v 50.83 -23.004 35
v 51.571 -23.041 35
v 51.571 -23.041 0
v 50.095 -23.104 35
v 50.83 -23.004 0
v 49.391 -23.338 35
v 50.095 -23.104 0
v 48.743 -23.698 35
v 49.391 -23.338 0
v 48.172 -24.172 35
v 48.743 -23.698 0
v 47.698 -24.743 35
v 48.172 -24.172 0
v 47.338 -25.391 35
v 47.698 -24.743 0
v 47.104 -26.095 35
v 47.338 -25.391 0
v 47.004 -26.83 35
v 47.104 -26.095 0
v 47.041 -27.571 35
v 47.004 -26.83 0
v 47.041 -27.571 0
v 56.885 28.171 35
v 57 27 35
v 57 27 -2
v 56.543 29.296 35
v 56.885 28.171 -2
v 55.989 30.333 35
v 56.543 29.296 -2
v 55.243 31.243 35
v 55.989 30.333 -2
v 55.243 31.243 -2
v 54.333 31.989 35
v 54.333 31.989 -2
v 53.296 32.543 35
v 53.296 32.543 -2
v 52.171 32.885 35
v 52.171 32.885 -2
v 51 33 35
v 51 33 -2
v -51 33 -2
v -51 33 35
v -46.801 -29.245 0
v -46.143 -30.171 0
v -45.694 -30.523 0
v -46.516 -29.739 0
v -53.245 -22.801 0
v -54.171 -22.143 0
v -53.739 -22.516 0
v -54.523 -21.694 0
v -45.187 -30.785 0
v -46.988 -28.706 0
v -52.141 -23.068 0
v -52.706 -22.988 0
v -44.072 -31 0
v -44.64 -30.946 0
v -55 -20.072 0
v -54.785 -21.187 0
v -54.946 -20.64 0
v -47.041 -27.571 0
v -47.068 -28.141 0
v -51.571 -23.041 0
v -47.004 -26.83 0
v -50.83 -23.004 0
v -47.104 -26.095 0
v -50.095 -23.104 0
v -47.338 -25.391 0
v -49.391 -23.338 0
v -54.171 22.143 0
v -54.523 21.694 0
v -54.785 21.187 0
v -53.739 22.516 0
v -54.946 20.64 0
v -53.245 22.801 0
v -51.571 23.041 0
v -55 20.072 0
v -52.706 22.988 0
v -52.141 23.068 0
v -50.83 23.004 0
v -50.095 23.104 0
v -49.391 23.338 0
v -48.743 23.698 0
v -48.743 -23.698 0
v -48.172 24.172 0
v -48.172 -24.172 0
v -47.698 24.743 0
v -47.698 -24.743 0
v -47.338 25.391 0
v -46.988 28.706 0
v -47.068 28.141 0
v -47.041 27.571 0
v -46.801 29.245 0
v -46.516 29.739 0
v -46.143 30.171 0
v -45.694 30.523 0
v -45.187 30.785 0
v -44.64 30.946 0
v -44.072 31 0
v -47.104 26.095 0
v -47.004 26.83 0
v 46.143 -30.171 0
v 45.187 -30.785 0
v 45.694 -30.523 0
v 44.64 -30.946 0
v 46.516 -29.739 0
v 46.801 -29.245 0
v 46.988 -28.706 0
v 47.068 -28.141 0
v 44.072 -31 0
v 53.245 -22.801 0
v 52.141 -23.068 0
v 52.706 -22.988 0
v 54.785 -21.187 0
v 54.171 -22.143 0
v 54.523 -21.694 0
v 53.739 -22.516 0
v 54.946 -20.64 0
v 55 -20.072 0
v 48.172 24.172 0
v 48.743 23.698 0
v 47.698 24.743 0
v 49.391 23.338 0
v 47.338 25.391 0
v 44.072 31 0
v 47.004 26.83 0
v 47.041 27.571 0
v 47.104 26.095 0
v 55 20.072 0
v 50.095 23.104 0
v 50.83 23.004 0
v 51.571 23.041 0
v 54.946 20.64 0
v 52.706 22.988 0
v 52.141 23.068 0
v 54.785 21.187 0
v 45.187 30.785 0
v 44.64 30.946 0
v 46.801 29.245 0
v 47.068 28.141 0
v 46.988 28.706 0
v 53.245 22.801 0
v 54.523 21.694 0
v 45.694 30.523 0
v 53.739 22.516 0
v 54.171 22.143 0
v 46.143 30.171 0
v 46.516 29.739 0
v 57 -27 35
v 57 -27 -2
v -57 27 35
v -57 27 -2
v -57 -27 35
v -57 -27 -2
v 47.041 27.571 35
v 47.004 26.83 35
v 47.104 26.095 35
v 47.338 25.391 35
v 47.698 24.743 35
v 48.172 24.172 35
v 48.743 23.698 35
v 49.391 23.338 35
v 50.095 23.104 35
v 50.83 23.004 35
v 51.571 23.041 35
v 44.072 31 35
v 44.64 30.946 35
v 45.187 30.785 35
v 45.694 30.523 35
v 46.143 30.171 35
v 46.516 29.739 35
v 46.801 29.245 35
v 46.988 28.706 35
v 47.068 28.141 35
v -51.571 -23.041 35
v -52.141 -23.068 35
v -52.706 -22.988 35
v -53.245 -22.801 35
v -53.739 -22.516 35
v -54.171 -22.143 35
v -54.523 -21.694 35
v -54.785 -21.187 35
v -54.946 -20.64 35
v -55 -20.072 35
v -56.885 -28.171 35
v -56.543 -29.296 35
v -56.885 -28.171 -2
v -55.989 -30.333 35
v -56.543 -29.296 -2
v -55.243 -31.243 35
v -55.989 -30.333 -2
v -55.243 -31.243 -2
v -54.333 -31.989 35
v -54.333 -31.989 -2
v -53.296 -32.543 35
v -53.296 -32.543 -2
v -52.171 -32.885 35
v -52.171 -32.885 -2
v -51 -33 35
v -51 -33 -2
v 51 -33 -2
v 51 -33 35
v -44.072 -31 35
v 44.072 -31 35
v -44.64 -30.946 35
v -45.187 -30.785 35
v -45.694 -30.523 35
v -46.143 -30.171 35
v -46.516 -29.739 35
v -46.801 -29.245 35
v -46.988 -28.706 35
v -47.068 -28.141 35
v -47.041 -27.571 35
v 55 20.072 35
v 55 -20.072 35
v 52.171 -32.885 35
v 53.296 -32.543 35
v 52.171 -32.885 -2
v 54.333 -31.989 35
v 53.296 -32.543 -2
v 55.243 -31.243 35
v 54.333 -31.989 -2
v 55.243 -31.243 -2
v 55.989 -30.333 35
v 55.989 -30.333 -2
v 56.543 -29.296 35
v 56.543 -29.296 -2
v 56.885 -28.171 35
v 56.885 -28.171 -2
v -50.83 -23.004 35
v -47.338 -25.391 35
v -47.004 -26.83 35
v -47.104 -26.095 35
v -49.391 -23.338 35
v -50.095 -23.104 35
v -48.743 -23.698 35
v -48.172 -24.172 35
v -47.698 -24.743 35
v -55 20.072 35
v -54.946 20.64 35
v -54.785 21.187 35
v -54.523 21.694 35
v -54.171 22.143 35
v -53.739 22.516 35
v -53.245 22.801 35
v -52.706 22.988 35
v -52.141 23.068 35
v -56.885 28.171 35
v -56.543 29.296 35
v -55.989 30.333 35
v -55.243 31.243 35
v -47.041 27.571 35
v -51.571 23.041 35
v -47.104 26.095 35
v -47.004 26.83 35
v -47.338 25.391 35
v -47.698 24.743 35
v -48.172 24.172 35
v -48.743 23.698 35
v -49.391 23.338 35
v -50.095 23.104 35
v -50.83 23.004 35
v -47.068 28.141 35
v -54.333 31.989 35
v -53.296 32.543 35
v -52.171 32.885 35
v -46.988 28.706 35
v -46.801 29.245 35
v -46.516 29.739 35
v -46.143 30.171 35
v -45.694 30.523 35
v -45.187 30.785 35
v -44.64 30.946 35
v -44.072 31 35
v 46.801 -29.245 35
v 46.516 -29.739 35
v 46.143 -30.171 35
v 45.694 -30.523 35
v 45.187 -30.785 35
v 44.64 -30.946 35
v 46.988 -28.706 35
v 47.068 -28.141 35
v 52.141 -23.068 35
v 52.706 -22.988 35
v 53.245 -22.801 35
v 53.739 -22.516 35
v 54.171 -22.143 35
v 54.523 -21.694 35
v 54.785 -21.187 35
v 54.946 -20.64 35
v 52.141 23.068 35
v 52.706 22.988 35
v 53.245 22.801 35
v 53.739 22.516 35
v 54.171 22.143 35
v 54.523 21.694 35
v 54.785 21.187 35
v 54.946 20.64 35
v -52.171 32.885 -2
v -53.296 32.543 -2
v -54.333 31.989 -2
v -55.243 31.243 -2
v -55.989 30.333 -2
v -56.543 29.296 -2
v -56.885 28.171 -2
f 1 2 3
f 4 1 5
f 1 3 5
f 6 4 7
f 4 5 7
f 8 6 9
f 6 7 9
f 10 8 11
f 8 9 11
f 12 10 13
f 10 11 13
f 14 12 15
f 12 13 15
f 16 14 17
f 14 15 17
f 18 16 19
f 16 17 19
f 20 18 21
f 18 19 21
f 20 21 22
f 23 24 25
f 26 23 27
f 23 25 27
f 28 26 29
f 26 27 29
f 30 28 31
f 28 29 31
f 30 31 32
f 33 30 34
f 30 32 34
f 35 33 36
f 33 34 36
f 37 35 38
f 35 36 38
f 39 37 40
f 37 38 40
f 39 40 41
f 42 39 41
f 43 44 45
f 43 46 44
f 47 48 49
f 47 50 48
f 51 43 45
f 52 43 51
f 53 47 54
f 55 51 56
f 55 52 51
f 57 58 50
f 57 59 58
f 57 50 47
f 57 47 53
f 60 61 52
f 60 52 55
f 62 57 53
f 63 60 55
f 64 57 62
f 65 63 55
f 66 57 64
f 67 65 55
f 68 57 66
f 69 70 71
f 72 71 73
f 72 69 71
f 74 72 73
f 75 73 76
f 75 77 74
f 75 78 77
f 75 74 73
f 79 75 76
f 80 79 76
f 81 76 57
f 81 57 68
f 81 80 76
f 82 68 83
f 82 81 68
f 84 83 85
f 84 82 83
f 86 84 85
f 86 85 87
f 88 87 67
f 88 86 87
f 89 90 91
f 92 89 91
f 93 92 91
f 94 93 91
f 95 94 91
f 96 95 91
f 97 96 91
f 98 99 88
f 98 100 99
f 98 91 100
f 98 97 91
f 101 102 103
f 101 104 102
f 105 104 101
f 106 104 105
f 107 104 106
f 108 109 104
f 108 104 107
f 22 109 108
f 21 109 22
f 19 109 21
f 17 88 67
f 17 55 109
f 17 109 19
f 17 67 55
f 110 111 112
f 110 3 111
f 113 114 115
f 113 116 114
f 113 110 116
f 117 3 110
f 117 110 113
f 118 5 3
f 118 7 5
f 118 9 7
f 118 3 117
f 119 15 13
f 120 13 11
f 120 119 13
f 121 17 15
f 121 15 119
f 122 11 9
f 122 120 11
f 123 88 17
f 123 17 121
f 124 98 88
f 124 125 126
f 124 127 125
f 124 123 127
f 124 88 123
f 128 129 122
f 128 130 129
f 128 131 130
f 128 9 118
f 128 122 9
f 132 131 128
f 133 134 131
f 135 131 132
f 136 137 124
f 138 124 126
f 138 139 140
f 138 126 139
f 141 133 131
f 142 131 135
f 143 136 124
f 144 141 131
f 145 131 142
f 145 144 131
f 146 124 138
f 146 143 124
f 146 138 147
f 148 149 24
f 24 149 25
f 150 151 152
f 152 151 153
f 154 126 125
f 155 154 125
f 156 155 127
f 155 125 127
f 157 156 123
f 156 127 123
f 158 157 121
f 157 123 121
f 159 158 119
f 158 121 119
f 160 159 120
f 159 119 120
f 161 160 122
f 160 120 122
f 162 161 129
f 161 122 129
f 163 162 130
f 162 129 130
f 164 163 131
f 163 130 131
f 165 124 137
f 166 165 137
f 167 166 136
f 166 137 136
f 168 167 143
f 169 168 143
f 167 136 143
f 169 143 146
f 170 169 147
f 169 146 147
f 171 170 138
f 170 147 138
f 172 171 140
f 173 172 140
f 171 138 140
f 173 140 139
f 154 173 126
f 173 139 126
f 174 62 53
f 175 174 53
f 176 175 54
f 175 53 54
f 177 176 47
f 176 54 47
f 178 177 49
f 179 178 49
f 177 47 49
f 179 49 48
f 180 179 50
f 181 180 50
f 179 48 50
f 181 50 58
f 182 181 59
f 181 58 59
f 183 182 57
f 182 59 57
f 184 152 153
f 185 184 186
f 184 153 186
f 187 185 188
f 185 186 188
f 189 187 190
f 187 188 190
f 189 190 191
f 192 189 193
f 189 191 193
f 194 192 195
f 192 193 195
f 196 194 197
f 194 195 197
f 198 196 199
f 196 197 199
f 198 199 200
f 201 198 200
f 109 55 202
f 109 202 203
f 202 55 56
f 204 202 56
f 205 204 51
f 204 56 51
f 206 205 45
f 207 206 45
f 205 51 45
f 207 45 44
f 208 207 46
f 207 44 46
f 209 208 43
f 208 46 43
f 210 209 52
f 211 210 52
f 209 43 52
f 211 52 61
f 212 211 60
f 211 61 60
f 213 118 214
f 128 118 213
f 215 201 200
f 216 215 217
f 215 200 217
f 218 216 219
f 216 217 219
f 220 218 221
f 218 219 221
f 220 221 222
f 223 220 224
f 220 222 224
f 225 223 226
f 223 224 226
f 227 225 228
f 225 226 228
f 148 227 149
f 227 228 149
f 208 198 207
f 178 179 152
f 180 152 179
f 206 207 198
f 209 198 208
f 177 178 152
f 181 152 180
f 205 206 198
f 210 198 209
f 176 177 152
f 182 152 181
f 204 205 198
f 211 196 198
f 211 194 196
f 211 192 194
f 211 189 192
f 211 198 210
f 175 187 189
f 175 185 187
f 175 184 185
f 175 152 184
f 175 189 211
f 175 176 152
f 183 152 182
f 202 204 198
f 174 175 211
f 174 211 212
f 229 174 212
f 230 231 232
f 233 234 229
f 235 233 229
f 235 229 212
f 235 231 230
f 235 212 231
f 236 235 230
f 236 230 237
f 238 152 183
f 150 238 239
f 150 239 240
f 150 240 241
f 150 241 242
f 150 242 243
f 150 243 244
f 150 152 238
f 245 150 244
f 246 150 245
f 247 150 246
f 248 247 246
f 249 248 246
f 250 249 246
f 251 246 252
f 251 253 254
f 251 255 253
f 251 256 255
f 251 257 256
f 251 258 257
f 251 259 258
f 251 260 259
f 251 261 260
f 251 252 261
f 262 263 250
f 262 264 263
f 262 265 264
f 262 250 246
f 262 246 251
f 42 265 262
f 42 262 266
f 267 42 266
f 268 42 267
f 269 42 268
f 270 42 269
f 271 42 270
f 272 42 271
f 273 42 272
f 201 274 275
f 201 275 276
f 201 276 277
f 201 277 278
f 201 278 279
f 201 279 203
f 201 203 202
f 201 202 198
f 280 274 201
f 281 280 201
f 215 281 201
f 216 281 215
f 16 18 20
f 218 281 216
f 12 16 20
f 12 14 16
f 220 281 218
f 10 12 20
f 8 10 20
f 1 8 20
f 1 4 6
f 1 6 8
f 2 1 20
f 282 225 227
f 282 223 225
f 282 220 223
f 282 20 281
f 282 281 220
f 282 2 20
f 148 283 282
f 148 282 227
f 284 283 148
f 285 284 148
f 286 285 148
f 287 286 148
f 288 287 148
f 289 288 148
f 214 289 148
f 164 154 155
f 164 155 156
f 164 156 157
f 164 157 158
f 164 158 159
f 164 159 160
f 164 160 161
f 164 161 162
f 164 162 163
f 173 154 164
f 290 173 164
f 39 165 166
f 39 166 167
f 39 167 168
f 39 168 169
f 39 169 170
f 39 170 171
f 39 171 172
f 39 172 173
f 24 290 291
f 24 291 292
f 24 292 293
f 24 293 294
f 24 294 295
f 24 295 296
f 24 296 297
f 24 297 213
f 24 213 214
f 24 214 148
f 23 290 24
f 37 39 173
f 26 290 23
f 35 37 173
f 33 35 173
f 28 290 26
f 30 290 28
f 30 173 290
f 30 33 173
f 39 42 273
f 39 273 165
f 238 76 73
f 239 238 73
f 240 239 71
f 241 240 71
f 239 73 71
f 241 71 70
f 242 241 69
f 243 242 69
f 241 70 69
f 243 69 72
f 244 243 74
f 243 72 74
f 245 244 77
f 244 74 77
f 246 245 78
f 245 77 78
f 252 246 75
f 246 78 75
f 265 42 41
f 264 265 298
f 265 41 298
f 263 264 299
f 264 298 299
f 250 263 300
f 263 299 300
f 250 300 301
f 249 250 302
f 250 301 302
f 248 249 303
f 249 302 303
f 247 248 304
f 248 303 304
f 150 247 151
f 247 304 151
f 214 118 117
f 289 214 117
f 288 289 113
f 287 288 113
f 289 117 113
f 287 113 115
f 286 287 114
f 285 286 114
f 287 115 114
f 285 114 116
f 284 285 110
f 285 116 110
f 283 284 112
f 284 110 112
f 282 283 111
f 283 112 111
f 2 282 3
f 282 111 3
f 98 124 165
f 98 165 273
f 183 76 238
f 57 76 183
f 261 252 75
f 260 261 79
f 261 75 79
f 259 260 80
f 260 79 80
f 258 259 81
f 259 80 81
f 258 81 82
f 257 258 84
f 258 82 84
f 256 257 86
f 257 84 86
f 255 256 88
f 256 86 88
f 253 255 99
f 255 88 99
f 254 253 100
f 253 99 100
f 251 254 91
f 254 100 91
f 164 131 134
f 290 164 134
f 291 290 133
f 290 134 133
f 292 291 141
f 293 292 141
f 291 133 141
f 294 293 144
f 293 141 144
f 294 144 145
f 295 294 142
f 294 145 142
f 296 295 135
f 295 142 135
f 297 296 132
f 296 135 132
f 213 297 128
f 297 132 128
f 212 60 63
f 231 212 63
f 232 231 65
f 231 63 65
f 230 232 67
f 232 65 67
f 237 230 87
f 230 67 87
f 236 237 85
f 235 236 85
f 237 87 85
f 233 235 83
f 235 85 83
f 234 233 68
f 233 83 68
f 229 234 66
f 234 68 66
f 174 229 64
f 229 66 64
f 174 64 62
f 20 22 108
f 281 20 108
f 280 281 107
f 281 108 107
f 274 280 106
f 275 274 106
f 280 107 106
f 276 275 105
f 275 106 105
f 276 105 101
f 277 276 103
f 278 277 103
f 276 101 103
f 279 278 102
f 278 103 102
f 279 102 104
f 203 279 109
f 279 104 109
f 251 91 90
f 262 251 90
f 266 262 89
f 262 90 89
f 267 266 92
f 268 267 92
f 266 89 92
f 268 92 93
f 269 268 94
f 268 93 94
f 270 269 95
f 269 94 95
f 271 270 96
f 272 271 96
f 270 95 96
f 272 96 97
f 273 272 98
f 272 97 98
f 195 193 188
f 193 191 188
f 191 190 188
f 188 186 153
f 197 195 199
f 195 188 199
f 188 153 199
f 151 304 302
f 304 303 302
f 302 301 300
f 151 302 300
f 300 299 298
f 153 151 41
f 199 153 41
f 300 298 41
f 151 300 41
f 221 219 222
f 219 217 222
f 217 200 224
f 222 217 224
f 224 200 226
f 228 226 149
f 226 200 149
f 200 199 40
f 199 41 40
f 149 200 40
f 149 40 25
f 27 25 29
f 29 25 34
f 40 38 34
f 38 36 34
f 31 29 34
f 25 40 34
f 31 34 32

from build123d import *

# Parameters (mm, degrees)
BOSS_EXTRUDE1_DEPTH = 35
SHELL1_T            = 2
SKETCH2_R           = 4
BOSS_EXTRUDE2_DEPTH = 35
FILLET2_START       = -1
FILLET2_DEPTH       = 36


with BuildPart() as part:
    # Sketch1 → Boss-Extrude1 (new body)
    with BuildSketch(Plane.XY):
        with BuildLine():
            Line((-51, -31), (51, -31))
            ThreePointArc((51, -31), (53.828427125, -29.828427125), (55, -27))
            Line((55, -27), (55, 27))
            ThreePointArc((55, 27), (53.828427125, 29.828427125), (51, 31))
            Line((51, 31), (-51, 31))
            ThreePointArc((-51, 31), (-53.828427125, 29.828427125), (-55, 27))
            Line((-55, 27), (-55, -27))
            ThreePointArc((-55, -27), (-53.828427125, -29.828427125), (-51, -31))
        make_face()
    extrude(amount=BOSS_EXTRUDE1_DEPTH)

    # Shell1
    shell1_openings = [part.faces().sort_by_distance(p)[0] for p in [
        (0, 0, 35),
    ]]
    offset(amount=SHELL1_T, openings=shell1_openings, kind=Kind.INTERSECTION)

    # Sketch2 → Boss-Extrude2 (add)
    with BuildSketch(Plane.XY):
        with Locations((-51, 27)):
            Circle(SKETCH2_R)
        with Locations((51, 27)):
            Circle(SKETCH2_R)
        with Locations((51, -27)):
            Circle(SKETCH2_R)
        with Locations((-51, -27)):
            Circle(SKETCH2_R)
    extrude(amount=BOSS_EXTRUDE2_DEPTH)

    # Fillet2: read off the stored shape, not the designer's step
    # Fillet2 outline → Fillet2 (add)
    with BuildSketch(Plane.XY.offset(FILLET2_START)):
        with BuildLine():
            ThreePointArc((51, -31), (48.381385317, -30.023715784), (47.041026725, -27.571428571))
            ThreePointArc((47.041026725, -27.571428571), (46.339583608, -29.963961012), (44.07179677, -31))
            Line((44.07179677, -31), (51, -31))
        make_face()
        with BuildLine():
            ThreePointArc((55, -20.07179677), (53.963961012, -22.339583608), (51.571428571, -23.041026726))
            ThreePointArc((51.571428571, -23.041026726), (54.023715784, -24.381385317), (55, -27))
            Line((55, -27), (55, -20.07179677))
        make_face()
        with BuildLine():
            Line((-51, -31), (-44.07179677, -31))
            ThreePointArc((-44.07179677, -31), (-46.339583608, -29.963961012), (-47.041026726, -27.571428571))
            ThreePointArc((-47.041026726, -27.571428571), (-48.381385317, -30.023715784), (-51, -31))
        make_face()
        with BuildLine():
            ThreePointArc((51.571428571, 23.041026726), (53.963961012, 22.339583608), (55, 20.07179677))
            Line((55, 20.07179677), (55, 27))
            ThreePointArc((55, 27), (54.023715784, 24.381385317), (51.571428571, 23.041026726))
        make_face()
        with BuildLine():
            ThreePointArc((-55, -27), (-54.023715784, -24.381385317), (-51.571428571, -23.041026725))
            ThreePointArc((-51.571428571, -23.041026725), (-53.963961012, -22.339583608), (-55, -20.07179677))
            Line((-55, -20.07179677), (-55, -27))
        make_face()
        with BuildLine():
            ThreePointArc((44.07179677, 31), (46.339583608, 29.963961012), (47.041026726, 27.571428571))
            ThreePointArc((47.041026726, 27.571428571), (48.381385317, 30.023715784), (51, 31))
            Line((51, 31), (44.07179677, 31))
        make_face()
        with BuildLine():
            Line((-55, 27), (-55, 20.07179677))
            ThreePointArc((-55, 20.07179677), (-53.963961012, 22.339583608), (-51.571428571, 23.041026726))
            ThreePointArc((-51.571428571, 23.041026726), (-54.023715784, 24.381385317), (-55, 27))
        make_face()
        with BuildLine():
            ThreePointArc((-47.041026726, 27.571428571), (-46.339583608, 29.963961012), (-44.07179677, 31))
            Line((-44.07179677, 31), (-51, 31))
            ThreePointArc((-51, 31), (-48.381385317, 30.023715784), (-47.041026726, 27.571428571))
        make_face()
    extrude(amount=FILLET2_DEPTH)


solid = part.part
